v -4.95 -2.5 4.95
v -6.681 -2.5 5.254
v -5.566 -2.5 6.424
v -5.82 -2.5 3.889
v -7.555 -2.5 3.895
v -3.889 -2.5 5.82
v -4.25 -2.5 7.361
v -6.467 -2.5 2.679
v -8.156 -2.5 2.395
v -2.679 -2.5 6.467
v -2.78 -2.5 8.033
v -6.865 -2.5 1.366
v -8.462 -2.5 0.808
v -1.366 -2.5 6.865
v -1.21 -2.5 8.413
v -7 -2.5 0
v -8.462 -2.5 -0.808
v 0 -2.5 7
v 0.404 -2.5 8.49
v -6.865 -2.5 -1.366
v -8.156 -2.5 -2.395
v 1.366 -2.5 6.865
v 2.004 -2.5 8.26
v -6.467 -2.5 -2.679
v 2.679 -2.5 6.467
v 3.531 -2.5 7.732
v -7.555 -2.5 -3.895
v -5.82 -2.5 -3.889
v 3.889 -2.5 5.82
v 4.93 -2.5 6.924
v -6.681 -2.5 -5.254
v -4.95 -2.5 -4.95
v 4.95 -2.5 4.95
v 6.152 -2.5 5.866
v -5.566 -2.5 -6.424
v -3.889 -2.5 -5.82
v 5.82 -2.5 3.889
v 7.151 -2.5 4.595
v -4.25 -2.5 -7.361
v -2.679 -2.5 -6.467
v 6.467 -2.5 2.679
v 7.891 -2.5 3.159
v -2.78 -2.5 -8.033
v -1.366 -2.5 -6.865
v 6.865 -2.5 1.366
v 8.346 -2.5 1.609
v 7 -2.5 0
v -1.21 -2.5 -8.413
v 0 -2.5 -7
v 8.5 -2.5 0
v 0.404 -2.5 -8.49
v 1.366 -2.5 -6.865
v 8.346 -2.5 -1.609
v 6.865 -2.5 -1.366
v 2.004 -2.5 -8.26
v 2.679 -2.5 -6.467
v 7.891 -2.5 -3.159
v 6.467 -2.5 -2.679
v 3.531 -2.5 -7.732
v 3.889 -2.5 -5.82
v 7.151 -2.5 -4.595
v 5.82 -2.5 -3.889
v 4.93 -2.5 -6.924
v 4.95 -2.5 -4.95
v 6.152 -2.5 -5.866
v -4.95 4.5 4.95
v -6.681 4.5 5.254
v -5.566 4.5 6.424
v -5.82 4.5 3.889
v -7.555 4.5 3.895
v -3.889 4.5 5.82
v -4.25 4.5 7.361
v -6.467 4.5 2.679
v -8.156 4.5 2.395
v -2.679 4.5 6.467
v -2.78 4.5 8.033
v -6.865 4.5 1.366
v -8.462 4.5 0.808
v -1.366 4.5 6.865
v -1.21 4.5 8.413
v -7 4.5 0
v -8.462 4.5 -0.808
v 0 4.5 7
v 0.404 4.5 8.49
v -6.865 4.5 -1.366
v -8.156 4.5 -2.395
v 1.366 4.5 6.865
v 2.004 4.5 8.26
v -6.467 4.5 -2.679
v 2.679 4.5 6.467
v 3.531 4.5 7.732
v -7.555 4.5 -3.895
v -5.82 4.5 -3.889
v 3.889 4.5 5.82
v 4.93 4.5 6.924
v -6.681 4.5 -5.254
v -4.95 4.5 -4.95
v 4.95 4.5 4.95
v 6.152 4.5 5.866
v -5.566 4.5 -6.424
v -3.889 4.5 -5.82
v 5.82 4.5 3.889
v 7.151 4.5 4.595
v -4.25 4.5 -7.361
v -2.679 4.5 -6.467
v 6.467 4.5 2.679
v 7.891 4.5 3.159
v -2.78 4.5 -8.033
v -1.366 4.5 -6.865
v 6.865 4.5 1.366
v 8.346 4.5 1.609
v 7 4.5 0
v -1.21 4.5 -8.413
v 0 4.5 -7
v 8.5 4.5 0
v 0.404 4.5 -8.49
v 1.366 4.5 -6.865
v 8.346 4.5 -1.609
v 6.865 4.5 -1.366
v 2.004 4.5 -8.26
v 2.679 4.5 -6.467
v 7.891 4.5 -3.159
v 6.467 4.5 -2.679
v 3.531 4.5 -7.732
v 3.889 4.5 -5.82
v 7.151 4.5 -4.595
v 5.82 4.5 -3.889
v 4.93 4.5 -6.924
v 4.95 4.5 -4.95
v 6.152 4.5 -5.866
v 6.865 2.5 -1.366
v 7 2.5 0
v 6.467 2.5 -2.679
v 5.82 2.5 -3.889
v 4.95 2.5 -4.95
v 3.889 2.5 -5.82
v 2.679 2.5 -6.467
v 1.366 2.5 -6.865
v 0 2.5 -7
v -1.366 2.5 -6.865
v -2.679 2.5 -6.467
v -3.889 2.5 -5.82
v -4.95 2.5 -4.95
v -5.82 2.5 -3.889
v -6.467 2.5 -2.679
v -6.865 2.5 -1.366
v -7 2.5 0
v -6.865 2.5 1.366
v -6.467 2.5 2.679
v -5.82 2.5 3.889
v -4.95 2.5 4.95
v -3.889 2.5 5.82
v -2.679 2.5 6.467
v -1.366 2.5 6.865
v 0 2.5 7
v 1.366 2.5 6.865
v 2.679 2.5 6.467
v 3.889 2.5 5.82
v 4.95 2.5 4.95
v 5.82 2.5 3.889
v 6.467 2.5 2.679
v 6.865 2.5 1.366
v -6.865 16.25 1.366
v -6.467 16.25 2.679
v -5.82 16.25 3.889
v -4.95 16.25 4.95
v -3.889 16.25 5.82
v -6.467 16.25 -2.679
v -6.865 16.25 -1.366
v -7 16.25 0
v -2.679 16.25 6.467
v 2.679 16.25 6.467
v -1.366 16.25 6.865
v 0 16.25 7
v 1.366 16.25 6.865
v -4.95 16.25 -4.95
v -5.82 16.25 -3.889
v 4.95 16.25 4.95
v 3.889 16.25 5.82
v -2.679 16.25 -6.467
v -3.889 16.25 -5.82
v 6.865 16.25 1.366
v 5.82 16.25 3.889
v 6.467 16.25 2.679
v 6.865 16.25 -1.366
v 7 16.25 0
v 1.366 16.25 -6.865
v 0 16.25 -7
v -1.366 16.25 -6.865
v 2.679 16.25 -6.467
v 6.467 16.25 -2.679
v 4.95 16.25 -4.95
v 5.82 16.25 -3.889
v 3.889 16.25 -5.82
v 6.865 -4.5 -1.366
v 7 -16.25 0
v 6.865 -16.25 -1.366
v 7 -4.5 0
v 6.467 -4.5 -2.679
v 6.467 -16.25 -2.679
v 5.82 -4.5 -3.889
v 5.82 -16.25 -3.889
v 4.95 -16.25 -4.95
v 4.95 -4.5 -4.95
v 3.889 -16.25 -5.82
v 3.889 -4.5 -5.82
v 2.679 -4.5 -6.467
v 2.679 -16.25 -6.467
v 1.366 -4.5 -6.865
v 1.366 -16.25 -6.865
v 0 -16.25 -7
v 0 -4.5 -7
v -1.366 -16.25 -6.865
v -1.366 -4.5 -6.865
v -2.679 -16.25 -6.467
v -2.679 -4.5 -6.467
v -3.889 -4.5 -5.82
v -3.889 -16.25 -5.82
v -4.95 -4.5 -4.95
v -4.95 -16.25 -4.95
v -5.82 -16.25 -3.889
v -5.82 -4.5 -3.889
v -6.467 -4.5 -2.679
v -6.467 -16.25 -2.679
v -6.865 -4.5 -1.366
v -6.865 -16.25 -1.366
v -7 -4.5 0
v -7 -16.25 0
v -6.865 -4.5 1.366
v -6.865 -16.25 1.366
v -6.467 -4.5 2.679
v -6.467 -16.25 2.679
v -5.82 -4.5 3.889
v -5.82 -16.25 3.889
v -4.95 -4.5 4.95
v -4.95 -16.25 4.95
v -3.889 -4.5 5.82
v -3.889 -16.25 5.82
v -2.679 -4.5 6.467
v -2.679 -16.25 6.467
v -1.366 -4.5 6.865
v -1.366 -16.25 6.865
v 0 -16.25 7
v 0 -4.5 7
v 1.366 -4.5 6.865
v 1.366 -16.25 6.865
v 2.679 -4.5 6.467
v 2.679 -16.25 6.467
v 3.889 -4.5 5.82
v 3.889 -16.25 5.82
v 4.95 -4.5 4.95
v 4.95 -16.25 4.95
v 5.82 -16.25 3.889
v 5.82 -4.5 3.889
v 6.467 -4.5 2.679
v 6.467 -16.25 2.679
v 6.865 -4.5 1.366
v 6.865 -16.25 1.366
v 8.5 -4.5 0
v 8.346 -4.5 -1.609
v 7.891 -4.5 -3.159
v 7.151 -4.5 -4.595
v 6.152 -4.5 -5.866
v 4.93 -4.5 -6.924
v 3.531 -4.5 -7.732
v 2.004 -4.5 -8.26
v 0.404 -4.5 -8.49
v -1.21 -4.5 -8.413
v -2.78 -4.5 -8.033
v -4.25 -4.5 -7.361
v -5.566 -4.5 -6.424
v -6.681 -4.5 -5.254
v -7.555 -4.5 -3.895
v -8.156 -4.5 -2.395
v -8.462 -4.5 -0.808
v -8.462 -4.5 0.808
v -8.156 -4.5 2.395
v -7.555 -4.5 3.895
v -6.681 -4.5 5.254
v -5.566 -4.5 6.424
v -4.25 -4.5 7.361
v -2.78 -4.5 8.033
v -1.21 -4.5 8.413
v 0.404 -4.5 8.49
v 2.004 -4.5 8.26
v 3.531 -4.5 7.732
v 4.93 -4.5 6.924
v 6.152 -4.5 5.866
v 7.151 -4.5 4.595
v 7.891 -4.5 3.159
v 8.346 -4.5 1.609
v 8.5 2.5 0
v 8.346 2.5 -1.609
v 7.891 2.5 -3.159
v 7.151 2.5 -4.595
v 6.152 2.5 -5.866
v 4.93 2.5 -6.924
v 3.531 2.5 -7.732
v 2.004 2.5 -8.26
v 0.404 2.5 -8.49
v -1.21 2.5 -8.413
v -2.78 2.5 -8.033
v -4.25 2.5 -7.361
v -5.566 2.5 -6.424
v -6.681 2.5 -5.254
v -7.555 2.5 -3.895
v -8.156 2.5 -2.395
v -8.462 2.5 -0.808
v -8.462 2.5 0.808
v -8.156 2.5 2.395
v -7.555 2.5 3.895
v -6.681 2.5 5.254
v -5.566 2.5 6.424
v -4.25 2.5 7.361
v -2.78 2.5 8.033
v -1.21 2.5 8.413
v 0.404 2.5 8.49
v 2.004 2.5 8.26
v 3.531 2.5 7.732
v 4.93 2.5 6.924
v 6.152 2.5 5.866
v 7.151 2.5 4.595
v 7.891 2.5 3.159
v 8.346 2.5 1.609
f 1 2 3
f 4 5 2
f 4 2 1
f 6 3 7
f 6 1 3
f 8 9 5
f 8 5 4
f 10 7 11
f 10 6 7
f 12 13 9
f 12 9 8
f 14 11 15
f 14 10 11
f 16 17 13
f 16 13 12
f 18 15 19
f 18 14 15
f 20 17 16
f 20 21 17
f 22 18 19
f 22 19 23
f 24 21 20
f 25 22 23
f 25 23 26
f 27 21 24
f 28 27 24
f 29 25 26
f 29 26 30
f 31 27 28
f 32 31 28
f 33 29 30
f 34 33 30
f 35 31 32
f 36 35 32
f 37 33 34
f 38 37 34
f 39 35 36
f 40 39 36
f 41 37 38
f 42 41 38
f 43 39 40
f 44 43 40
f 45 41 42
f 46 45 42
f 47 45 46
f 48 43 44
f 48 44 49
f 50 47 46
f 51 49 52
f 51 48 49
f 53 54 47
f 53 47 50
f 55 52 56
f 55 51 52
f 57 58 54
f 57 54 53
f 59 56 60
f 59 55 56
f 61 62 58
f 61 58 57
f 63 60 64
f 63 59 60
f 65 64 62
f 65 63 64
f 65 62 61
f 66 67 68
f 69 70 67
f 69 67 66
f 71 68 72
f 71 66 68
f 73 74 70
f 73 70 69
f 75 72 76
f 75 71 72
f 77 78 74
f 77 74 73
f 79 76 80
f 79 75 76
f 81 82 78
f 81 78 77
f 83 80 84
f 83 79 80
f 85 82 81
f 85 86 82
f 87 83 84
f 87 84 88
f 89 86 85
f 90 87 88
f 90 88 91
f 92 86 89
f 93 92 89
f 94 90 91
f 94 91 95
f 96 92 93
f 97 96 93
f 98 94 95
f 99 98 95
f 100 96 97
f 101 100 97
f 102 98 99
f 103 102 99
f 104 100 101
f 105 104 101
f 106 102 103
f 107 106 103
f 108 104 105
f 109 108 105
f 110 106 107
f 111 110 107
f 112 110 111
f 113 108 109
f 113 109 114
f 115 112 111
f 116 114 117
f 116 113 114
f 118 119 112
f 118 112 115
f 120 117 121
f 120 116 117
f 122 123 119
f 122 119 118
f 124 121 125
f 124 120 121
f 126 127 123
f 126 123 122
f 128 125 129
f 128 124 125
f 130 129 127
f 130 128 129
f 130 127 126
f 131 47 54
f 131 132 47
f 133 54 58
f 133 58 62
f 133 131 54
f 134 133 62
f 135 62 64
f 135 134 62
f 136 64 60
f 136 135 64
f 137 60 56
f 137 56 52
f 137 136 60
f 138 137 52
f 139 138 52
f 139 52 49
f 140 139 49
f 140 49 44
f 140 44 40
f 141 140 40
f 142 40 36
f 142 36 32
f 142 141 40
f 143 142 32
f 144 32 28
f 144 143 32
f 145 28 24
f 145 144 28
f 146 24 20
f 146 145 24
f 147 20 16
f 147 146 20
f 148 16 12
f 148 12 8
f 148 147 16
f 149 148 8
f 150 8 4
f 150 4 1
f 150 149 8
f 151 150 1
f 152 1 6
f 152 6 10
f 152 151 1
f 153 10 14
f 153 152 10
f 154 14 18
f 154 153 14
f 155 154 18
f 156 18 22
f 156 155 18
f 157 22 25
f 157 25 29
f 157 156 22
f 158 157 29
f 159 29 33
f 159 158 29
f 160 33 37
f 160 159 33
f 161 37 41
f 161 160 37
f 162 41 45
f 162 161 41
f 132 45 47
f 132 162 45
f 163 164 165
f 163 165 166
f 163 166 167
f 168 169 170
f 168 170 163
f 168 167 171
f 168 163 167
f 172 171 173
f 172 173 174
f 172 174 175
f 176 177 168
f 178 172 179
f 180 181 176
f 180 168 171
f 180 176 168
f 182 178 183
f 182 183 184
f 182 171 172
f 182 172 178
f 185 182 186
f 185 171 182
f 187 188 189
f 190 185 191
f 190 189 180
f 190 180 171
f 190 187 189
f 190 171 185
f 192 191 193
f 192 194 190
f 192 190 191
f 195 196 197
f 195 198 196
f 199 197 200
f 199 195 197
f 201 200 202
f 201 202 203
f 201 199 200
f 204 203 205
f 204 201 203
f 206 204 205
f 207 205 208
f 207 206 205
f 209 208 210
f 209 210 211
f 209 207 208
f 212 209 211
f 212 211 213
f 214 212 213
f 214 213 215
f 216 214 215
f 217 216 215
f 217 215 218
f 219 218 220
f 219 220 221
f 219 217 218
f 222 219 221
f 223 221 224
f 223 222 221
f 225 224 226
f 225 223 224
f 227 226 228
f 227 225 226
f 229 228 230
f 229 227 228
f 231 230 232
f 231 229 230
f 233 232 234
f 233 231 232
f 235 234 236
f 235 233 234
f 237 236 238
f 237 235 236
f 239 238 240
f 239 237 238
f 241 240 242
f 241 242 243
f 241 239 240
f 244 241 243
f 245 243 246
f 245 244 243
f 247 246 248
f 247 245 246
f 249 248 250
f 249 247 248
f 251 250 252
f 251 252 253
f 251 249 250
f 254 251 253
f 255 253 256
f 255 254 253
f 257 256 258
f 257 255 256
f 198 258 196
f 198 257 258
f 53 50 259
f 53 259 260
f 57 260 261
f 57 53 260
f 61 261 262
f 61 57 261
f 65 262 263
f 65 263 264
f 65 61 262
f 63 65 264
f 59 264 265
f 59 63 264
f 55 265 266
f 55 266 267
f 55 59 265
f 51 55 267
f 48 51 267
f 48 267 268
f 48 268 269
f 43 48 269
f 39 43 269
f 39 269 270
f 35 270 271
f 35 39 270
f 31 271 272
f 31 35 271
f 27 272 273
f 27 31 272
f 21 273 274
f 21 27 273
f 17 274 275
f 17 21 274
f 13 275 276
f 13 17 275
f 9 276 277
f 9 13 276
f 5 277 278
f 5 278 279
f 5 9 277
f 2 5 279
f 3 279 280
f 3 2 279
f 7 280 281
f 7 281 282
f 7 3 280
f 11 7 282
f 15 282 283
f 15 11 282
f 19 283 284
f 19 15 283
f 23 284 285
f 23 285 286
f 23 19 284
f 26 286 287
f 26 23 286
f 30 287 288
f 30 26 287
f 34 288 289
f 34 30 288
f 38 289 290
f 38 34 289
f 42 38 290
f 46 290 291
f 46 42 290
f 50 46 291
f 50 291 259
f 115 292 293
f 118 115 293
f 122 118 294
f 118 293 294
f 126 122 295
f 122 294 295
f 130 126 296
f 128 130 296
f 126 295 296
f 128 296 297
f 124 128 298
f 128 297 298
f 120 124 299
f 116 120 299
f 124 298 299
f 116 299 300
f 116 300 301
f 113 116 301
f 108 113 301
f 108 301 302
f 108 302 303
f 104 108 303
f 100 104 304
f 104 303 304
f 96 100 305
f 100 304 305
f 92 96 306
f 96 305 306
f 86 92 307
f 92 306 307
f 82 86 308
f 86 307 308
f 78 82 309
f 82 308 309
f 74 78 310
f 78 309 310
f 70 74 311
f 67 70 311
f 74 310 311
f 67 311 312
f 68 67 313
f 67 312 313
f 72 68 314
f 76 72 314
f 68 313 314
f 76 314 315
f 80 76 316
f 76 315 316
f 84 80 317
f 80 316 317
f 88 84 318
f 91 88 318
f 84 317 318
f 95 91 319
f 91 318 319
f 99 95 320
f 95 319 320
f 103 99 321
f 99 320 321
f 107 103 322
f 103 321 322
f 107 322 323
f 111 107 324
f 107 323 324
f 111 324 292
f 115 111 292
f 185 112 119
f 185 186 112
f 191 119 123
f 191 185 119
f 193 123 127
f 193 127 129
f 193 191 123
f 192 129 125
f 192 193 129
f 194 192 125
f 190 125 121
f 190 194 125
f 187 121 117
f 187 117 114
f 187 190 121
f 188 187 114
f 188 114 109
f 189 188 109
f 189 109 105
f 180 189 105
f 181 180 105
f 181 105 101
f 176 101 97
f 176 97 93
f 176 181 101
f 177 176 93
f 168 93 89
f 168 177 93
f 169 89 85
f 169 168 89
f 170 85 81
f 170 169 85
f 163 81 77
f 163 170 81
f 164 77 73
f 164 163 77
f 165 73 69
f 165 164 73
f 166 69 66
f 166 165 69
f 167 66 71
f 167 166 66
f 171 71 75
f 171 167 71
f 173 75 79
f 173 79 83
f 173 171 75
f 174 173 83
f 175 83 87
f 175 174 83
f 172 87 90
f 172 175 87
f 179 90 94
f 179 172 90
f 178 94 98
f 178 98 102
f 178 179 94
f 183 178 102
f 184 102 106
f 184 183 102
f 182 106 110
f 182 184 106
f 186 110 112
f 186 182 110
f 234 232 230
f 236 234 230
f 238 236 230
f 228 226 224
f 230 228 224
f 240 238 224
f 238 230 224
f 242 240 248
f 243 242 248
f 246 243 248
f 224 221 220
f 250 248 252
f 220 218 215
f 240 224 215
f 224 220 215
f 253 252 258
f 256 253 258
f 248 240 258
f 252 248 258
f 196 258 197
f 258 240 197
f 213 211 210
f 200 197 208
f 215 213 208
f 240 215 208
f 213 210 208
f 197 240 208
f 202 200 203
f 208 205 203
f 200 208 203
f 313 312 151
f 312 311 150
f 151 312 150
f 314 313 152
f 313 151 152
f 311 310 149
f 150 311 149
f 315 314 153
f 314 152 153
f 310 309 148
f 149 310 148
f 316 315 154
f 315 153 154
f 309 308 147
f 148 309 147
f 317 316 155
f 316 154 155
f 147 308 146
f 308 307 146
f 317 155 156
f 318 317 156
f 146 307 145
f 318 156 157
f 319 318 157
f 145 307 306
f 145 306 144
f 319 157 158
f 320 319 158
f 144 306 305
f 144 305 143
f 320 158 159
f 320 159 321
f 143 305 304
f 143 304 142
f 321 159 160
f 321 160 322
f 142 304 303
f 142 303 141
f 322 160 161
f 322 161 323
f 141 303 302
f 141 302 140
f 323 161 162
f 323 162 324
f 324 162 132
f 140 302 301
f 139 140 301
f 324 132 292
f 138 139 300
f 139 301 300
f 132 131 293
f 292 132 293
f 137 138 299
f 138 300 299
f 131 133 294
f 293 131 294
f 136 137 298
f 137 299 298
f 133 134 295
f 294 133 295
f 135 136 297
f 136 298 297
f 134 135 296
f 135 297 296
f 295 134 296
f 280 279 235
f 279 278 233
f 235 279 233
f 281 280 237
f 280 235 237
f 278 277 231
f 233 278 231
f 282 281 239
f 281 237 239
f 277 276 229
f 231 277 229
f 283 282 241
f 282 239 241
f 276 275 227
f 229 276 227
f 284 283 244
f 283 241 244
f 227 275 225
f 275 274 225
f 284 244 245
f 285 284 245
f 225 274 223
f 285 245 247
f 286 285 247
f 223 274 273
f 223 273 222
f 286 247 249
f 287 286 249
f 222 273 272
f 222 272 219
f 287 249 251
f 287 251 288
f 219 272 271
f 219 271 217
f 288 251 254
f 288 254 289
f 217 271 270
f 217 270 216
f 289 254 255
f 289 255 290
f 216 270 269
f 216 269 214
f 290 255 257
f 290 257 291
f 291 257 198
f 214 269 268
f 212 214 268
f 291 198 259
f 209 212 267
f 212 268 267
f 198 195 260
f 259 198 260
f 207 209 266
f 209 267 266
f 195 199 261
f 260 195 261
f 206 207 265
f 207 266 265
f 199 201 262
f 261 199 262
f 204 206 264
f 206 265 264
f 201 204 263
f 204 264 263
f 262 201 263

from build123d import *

# Parameters (mm, degrees)
SKETCH_1_R      = 7
EXTRUDE_1_DEPTH = 16.25
EXTRUDE_START   = 2.5
SKETCH_2_R      = 8.5
EXTRUDE_2_DEPTH = 2


with BuildPart() as part:
    # 草图1 → 凸台-拉伸1 (new body, symmetric)
    with BuildSketch(Plane(origin=(0, 0, 0), x_dir=(1, 0, 0), z_dir=(0, 1, 0))):
        Circle(SKETCH_1_R)
    extrude(amount=EXTRUDE_1_DEPTH, both=True)

    # 草图2 → 凸台-拉伸2 (add)
    with BuildSketch(Plane(origin=(0, 0, 0), x_dir=(1, 0, 0), z_dir=(0, 1, 0)).offset(EXTRUDE_START)):
        Circle(SKETCH_2_R)
    extrude_2 = extrude(amount=EXTRUDE_2_DEPTH)

    # 镜向1: 凸台-拉伸2 across plane
    add(extrude_2.mirror(Plane.ZX))


solid = part.part
